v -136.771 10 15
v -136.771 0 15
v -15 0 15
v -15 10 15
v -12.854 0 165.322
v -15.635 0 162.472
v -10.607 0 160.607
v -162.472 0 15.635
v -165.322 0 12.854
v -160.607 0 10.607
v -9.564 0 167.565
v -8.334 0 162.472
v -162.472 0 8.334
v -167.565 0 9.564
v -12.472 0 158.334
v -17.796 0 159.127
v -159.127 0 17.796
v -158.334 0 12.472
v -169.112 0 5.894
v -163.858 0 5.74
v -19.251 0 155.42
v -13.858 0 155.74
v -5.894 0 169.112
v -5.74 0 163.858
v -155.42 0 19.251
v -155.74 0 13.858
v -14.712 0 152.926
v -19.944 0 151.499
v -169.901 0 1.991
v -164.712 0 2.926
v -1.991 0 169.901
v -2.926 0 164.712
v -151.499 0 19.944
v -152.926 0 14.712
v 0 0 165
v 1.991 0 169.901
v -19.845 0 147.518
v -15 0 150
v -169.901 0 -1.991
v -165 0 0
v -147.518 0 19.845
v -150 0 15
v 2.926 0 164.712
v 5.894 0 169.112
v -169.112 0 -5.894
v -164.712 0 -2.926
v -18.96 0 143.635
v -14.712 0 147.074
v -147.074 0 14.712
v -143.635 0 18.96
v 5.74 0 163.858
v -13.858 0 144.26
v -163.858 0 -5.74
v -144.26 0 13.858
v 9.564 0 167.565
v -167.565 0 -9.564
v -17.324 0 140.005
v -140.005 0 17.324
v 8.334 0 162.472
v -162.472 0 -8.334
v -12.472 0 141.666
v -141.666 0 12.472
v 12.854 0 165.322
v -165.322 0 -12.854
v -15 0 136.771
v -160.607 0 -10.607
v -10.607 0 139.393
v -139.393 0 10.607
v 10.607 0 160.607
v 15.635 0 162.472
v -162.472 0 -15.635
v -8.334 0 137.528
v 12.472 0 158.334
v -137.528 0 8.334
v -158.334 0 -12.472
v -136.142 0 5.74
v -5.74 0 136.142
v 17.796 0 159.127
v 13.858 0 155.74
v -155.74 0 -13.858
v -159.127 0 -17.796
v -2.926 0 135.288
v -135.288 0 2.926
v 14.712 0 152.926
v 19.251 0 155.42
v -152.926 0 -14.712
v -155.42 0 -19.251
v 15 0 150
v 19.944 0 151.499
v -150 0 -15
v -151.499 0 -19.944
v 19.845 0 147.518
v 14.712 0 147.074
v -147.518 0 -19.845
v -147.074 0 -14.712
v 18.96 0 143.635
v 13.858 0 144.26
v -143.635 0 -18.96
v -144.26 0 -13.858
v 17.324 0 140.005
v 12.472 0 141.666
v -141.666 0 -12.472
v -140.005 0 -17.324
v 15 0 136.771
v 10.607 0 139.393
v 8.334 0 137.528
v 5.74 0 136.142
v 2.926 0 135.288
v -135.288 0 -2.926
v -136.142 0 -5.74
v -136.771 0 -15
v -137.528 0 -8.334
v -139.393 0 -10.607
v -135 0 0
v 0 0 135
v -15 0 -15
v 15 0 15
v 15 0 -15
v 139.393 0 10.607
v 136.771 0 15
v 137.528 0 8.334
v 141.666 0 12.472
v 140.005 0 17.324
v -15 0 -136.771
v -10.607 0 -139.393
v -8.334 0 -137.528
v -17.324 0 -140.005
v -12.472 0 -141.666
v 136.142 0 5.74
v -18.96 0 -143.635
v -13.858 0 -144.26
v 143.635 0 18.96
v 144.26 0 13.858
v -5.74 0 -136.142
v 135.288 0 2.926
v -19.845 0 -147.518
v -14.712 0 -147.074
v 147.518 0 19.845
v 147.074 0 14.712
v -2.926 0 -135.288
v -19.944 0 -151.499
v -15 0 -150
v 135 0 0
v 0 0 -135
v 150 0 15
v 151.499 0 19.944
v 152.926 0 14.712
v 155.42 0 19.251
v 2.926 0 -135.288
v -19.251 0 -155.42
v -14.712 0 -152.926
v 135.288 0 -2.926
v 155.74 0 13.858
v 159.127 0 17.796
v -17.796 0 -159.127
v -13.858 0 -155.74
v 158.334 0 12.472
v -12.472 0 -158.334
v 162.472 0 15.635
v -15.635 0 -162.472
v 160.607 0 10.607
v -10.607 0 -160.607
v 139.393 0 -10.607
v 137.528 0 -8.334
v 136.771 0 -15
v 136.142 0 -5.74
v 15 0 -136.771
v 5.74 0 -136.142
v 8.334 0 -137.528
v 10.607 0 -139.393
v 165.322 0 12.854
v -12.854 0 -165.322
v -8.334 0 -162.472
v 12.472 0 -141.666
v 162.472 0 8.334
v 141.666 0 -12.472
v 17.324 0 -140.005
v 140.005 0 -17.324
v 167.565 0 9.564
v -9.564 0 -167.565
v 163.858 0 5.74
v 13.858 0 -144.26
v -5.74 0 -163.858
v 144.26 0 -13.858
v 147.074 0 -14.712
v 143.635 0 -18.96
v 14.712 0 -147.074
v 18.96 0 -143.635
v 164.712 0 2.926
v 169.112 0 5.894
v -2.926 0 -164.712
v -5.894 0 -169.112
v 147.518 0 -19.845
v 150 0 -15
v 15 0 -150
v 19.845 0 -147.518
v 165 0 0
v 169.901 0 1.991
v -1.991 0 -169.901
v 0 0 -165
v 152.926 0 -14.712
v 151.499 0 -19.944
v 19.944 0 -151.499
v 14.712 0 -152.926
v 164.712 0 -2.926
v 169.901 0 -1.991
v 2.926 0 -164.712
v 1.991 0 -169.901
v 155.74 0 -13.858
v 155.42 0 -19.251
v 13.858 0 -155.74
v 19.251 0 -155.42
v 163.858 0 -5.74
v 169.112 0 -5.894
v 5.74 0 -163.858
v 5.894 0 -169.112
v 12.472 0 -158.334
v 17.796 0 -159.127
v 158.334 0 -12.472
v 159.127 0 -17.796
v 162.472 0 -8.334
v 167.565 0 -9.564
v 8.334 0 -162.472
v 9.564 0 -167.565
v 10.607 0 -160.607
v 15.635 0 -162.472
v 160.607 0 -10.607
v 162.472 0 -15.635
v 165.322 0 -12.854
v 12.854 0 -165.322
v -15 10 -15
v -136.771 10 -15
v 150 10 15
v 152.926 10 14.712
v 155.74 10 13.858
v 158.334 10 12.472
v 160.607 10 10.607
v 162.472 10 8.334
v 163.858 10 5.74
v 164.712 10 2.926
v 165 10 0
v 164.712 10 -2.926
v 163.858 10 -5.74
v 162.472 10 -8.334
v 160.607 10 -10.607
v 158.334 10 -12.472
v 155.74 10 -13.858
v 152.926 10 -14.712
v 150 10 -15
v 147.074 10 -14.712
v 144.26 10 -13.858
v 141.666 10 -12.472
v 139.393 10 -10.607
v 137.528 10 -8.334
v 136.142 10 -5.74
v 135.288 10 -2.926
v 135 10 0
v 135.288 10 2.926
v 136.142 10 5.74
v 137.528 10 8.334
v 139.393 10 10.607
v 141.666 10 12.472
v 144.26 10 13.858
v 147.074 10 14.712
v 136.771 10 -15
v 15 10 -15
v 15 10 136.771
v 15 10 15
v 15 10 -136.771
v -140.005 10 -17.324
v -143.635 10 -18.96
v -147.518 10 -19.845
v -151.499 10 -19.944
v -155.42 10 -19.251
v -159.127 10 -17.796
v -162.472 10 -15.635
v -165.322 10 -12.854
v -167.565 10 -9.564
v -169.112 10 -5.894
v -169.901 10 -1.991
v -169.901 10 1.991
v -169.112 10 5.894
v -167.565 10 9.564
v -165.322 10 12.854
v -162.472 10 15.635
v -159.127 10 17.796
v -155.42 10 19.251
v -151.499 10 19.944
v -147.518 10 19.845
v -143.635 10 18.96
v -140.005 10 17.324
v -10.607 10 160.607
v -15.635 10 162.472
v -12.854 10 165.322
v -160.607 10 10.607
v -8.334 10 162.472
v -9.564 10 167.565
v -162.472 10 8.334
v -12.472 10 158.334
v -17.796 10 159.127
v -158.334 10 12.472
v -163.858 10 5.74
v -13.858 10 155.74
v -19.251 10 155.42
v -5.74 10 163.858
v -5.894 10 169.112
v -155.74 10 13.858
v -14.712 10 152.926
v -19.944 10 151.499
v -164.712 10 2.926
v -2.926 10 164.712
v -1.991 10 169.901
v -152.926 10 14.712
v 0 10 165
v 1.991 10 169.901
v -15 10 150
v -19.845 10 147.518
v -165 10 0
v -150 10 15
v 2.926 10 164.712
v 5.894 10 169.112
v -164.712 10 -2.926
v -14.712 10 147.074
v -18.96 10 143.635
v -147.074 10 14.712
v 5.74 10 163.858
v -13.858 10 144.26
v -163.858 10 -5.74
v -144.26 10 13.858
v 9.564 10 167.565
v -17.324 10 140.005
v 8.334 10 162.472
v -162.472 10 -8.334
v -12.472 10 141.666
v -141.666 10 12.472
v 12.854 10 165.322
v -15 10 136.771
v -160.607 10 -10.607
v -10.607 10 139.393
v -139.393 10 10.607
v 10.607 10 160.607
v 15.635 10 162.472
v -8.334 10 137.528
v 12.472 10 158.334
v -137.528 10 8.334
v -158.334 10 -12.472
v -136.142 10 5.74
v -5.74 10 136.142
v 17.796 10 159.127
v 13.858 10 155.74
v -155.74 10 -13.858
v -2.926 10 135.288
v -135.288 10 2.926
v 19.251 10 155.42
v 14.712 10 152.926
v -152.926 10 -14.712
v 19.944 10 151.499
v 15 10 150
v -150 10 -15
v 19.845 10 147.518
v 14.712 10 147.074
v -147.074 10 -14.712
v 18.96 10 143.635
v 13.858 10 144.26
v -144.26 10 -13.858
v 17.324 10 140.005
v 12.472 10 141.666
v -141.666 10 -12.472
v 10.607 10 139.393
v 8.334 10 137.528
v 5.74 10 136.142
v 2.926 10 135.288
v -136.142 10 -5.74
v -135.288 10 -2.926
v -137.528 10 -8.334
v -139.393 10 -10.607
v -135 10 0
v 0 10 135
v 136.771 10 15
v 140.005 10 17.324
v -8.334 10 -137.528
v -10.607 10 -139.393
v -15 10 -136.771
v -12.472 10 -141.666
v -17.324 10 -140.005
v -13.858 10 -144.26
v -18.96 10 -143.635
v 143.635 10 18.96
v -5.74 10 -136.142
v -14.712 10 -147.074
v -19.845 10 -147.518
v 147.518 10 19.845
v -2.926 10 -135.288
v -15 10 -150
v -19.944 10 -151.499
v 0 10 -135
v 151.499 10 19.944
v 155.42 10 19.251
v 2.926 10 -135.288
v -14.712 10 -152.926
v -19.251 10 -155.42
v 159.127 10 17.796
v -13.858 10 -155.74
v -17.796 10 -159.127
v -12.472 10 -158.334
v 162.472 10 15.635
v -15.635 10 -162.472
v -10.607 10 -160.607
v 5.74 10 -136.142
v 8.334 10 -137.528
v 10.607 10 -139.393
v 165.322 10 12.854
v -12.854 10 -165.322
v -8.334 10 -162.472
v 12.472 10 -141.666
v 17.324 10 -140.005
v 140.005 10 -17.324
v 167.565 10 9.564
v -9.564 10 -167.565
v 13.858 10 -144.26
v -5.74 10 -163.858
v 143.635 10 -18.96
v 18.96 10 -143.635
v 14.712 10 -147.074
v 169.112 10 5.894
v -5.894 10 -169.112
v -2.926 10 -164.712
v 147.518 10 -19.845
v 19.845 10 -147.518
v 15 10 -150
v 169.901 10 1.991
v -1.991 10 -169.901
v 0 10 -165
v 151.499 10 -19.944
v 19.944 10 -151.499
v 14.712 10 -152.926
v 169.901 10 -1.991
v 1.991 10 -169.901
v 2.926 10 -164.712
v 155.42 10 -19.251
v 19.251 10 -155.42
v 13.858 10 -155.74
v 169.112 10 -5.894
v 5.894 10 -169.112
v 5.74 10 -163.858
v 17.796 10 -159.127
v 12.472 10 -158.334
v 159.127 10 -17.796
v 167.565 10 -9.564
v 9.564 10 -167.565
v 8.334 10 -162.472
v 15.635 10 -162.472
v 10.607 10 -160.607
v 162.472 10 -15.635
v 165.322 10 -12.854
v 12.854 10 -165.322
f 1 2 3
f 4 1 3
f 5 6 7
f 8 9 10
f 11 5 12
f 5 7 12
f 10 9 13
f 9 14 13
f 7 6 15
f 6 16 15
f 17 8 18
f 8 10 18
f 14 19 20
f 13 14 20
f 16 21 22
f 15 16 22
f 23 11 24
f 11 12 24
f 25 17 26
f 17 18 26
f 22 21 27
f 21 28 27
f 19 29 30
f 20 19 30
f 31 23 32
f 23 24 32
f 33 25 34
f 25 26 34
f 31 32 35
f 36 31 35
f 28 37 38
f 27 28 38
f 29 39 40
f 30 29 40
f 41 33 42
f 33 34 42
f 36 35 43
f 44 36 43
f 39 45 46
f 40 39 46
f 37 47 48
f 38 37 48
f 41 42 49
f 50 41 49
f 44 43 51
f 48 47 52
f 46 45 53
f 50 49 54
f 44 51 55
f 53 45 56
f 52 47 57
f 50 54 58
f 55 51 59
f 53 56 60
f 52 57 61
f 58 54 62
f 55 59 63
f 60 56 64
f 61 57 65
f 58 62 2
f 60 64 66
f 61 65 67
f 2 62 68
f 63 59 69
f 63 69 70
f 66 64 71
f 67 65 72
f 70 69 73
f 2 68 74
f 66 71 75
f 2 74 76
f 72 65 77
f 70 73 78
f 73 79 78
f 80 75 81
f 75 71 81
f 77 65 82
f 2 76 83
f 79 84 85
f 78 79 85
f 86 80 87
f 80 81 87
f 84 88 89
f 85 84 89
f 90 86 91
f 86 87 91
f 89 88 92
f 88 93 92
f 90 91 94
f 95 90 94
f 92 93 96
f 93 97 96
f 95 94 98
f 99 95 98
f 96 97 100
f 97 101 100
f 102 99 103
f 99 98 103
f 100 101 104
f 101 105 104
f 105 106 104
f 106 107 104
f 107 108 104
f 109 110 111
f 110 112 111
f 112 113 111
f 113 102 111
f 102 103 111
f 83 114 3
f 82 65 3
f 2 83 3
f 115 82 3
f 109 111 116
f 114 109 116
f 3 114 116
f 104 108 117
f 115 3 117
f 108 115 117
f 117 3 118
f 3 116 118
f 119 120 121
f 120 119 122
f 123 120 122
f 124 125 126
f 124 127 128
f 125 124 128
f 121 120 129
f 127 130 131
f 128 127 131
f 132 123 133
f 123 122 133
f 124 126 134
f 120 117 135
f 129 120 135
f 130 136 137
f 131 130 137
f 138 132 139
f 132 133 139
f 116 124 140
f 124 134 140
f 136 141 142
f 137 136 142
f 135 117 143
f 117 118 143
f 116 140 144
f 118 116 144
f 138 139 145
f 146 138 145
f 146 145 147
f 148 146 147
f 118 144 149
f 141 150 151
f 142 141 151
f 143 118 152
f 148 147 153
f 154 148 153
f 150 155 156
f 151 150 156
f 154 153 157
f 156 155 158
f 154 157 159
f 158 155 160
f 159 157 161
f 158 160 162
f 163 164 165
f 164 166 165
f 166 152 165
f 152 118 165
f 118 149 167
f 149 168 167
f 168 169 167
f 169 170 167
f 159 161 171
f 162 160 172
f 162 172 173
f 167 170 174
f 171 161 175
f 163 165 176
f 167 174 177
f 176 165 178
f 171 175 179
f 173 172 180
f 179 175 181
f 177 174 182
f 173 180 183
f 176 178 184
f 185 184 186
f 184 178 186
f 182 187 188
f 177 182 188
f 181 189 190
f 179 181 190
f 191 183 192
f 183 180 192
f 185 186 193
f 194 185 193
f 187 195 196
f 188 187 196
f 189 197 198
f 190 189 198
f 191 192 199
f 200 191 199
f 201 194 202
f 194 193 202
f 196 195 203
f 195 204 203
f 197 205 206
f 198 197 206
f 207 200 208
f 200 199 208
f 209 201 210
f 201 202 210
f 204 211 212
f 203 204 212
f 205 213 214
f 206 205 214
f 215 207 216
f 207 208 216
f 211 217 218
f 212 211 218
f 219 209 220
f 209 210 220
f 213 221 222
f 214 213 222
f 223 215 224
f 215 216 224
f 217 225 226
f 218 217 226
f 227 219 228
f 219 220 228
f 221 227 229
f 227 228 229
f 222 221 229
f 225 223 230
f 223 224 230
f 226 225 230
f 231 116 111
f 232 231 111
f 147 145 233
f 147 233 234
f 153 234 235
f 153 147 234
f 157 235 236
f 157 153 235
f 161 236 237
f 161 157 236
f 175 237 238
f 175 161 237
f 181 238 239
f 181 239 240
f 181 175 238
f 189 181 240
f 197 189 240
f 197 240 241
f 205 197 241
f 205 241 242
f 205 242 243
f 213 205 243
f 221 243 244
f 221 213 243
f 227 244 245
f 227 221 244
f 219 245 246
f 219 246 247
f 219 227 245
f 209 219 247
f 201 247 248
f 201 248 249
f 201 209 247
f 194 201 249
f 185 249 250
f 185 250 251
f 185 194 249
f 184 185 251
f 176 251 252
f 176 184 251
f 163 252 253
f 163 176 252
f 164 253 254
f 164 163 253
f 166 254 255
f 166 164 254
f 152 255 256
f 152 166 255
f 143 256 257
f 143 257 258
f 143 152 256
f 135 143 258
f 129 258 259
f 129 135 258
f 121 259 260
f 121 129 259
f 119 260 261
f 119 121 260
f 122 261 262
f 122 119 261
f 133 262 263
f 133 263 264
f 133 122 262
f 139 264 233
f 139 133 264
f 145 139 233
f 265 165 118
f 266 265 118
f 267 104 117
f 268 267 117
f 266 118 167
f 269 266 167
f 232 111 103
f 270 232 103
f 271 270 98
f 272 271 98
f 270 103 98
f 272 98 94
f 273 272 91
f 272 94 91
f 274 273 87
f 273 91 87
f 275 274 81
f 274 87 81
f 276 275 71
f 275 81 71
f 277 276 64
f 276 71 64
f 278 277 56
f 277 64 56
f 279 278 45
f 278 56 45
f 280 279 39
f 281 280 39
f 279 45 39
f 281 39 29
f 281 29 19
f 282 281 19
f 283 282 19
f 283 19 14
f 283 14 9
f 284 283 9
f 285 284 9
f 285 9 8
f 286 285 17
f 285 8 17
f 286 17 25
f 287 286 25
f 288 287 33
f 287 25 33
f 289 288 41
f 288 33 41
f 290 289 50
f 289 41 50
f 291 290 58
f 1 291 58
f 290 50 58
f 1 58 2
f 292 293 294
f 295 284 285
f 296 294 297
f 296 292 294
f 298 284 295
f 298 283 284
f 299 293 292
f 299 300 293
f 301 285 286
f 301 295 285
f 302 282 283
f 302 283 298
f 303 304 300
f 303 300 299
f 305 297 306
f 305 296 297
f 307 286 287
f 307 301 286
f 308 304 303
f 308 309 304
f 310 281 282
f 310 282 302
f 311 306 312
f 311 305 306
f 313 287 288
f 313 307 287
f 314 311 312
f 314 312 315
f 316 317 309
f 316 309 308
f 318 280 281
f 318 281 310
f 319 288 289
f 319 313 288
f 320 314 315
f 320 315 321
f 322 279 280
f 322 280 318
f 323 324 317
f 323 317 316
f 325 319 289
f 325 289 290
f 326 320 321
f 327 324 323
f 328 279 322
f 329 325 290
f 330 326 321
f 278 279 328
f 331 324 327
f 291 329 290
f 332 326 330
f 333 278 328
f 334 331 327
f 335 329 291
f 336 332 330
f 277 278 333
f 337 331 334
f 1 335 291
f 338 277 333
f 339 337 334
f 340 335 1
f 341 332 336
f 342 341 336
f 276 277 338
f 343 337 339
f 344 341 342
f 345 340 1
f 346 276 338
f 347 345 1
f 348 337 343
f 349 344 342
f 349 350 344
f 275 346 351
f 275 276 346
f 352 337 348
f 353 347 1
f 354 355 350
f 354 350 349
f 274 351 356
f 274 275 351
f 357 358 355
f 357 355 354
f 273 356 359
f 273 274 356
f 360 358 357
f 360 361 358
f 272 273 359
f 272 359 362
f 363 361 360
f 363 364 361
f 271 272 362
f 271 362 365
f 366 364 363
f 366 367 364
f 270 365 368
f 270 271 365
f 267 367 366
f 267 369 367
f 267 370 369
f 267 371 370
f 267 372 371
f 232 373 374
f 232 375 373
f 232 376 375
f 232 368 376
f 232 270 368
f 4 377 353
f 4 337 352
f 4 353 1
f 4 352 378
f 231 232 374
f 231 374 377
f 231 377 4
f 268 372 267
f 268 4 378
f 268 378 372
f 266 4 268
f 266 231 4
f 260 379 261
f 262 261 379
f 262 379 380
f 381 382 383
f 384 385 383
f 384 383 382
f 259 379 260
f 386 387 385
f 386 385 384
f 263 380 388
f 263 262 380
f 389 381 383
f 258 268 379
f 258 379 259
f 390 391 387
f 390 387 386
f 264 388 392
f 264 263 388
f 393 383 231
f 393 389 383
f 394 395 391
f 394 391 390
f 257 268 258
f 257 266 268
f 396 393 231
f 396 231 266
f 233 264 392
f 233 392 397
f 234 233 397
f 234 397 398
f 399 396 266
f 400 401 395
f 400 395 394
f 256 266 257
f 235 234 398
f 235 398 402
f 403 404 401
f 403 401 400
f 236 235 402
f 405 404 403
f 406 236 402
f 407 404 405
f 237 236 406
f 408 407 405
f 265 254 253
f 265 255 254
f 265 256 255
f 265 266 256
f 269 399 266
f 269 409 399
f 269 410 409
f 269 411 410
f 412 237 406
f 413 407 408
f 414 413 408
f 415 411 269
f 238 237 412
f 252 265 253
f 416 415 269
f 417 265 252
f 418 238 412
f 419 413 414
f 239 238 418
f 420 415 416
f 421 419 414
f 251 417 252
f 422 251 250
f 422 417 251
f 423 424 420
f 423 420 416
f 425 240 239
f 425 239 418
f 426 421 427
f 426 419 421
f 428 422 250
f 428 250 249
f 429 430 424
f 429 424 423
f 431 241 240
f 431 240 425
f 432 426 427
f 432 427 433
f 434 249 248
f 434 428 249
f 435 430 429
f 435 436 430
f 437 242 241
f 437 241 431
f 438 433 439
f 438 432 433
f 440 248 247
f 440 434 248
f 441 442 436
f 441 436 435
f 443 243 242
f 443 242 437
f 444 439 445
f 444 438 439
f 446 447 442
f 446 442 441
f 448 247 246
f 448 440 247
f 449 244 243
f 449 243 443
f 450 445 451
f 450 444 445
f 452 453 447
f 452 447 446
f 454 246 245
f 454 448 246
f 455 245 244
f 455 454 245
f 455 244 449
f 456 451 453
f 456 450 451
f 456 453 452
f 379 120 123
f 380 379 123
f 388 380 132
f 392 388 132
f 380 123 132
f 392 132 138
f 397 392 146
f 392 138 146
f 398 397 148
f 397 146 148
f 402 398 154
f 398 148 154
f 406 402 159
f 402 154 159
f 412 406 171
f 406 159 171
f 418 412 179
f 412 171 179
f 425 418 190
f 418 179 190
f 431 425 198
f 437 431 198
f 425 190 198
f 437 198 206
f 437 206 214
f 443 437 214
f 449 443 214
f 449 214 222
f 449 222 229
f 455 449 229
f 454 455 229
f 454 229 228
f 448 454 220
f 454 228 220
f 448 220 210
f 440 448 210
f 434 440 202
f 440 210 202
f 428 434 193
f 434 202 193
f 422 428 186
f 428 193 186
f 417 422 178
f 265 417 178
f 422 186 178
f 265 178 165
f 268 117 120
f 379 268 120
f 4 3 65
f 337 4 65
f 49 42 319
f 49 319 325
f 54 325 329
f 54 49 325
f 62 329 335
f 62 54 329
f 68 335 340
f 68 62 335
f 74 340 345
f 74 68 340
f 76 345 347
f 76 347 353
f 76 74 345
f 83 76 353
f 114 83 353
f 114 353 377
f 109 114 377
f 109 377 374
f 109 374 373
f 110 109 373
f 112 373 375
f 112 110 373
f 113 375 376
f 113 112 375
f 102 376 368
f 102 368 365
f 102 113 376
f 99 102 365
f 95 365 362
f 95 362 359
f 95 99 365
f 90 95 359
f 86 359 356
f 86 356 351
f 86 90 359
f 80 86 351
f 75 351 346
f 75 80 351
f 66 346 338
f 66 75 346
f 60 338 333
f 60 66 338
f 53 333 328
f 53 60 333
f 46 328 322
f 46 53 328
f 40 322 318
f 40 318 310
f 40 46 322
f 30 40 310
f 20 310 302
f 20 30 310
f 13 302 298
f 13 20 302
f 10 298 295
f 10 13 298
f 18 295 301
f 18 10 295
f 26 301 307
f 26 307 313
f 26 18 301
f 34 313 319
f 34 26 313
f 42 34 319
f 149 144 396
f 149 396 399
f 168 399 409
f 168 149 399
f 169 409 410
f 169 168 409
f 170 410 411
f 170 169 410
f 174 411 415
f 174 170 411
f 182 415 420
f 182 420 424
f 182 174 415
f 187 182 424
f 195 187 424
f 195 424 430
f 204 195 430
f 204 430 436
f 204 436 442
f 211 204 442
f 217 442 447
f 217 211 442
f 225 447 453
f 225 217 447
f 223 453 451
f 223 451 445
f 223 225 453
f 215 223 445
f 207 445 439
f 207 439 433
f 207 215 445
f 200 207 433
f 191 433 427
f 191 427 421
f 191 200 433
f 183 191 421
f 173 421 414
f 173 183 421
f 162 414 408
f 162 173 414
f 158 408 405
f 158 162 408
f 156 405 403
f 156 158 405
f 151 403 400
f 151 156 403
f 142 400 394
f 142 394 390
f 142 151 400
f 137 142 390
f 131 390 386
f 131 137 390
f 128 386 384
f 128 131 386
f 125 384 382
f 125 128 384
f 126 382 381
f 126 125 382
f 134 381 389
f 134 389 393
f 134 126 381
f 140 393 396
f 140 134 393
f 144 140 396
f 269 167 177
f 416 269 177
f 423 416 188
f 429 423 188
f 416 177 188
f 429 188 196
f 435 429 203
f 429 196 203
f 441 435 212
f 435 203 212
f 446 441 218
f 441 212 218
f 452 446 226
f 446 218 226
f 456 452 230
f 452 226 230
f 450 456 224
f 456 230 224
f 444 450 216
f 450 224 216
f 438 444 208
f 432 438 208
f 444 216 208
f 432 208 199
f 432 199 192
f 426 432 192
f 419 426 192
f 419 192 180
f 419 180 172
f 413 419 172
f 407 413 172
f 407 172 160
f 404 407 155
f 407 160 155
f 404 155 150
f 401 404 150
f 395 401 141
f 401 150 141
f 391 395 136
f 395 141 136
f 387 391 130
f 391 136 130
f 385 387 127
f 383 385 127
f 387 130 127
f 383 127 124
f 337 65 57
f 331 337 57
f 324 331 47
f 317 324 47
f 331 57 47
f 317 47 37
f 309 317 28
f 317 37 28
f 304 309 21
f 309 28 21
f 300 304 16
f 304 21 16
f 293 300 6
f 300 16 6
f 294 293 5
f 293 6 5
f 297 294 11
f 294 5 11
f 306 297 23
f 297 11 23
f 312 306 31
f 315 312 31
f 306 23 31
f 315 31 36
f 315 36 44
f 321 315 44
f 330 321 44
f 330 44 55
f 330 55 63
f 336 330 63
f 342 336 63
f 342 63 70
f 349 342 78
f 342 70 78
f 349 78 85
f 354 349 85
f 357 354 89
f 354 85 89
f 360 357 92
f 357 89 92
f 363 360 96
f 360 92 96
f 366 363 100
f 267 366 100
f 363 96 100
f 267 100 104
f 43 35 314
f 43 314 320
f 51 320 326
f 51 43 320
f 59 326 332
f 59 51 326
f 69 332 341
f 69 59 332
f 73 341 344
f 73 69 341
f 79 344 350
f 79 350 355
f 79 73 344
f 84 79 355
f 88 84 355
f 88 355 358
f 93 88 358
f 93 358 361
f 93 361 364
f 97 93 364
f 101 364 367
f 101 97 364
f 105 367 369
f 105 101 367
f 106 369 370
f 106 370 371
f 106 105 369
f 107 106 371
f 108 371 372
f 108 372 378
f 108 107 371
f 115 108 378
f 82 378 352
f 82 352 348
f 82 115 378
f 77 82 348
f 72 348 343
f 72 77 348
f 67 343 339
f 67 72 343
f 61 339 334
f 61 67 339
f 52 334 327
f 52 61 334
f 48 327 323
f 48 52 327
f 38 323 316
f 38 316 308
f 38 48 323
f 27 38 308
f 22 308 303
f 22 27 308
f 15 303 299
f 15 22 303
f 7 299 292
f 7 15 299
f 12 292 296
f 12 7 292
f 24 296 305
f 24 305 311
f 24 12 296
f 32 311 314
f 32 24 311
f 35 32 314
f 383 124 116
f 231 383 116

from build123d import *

# Parameters (mm, degrees)
SKETCH1_R           = 15
SKETCH1_W           = 30
SKETCH1_H           = 30
BOSS_EXTRUDE2_DEPTH = 10


with BuildPart() as part:
    # Sketch1 → Boss-Extrude2 (new body)
    # profile 1 of 5: a face of its own
    with BuildSketch(Plane(origin=(0, 0, 0), x_dir=(1, 0, 0), z_dir=(0, 1, 0))):
        with BuildLine():
            Line((15, -15), (-15, -15))
            Line((-15, -15), (-15, -136.771243445))
            ThreePointArc((-15, -136.771243445), (0, -170), (15, -136.771243445))
            Line((15, -136.771243445), (15, -15))
        make_face()
        with Locations(Location((0, -150, 0), (0, 0, 270))):
            Circle(SKETCH1_R, mode=Mode.SUBTRACT)
    # profile 2 of 5: a face of its own
    with BuildSketch(Plane(origin=(0, 0, 0), x_dir=(1, 0, 0), z_dir=(0, 1, 0))):
        Rectangle(SKETCH1_W, SKETCH1_H)
    # profile 3 of 5: a face of its own
    with BuildSketch(Plane(origin=(0, 0, 0), x_dir=(1, 0, 0), z_dir=(0, 1, 0))):
        with BuildLine():
            Line((-15, 136.771243445), (-15, 15))
            Line((-15, 15), (15, 15))
            Line((15, 15), (15, 136.771243445))
            ThreePointArc((15, 136.771243445), (0, 170), (-15, 136.771243445))
        make_face()
        with Locations(Location((0, 150, 0), (0, 0, 270))):
            Circle(SKETCH1_R, mode=Mode.SUBTRACT)
    # profile 4 of 5: a face of its own
    with BuildSketch(Plane(origin=(0, 0, 0), x_dir=(1, 0, 0), z_dir=(0, 1, 0))):
        with BuildLine():
            Line((-15, 15), (-136.771243445, 15))
            ThreePointArc((-136.771243445, 15), (-170, 0), (-136.771243445, -15))
            Line((-136.771243445, -15), (-15, -15))
            Line((-15, -15), (-15, 15))
        make_face()
        with Locations(Location((-150, 0, 0), (0, 0, 270))):
            Circle(SKETCH1_R, mode=Mode.SUBTRACT)
    # profile 5 of 5: a face of its own
    with BuildSketch(Plane(origin=(0, 0, 0), x_dir=(1, 0, 0), z_dir=(0, 1, 0))):
        with BuildLine():
            Line((136.771243445, 15), (15, 15))
            Line((15, 15), (15, -15))
            Line((15, -15), (136.771243445, -15))
            ThreePointArc((136.771243445, -15), (170, 0), (136.771243445, 15))
        make_face()
        with Locations(Location((150, 0, 0), (0, 0, 270))):
            Circle(SKETCH1_R, mode=Mode.SUBTRACT)
    extrude(amount=BOSS_EXTRUDE2_DEPTH)


solid = part.part
